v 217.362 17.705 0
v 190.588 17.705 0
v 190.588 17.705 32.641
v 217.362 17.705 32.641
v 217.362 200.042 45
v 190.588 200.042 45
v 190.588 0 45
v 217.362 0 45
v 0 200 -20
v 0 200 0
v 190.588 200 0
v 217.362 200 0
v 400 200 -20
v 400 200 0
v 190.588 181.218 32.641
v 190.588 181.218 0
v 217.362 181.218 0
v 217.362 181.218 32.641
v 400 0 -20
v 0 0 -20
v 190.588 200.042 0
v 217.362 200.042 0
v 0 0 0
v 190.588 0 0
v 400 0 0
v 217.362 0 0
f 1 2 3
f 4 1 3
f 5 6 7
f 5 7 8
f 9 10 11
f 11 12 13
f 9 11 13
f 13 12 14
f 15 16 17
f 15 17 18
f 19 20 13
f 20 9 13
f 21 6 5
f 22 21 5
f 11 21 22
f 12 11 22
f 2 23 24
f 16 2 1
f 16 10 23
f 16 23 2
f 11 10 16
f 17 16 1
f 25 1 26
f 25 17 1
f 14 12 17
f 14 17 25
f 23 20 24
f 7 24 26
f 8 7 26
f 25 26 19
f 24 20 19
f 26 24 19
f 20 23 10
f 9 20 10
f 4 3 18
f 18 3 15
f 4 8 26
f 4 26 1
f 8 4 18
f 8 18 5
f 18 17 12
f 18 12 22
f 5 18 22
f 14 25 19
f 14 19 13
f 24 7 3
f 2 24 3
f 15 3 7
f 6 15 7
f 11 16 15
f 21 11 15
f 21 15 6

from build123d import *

# Parameters (mm, degrees)
F0_W      = 400
F0_H      = 200
F1_DEPTH  = 25
F2_W      = 26.7749875784
F2_H      = 200.0415027142
F3_DEPTH  = 45
F4_W      = 163.5136380792
F4_H      = 32.6408185065
F5_DEPTH  = 400.001
F8_DEPTH  = 25
F8_TAPER  = -60
F9_W      = 212.9299342632
F9_H      = 224.1696352139
F10_DEPTH = 25
F12_W     = 417.4379836768
F12_H     = 216.8577280827
F13_DEPTH = 25


with BuildPart() as f1:
    # F0 (on Top) → F1 (new body)
    with BuildSketch(Plane.XY):
        with Locations((200, 100)):
            Rectangle(F0_W, F0_H)
    extrude(amount=-F1_DEPTH)

    # F2 (on Top) → F3 (join)
    with BuildSketch(Plane.XY):
        with Locations((203.9749994874, 100.0207513571)):
            Rectangle(F2_W, F2_H)
    extrude(amount=F3_DEPTH)

    # F4 (on Right) → F5 (cut, through all)
    with BuildSketch(Plane.YZ):
        with Locations((99.4616560638, 16.3204092532)):
            Rectangle(F4_W, F4_H)
    extrude(amount=F5_DEPTH, mode=Mode.SUBTRACT)

    # F7 (on offset) → F8 (cut)
    with BuildSketch(Plane.XY.offset(-20)):
        with BuildLine():
            add(Edge.make_bspline(
                [(391.8431701423, 100.8600369096), (391.8431701423, 259.7252513864), (102.5679333925, 180.292644148), (-186.7073033574, 100.8600369096), (102.5679333925, 21.4274296712), (391.8431701423, -58.0051775672), (391.8431701423, 100.8600369096)],
                knots=[0, 0, 0, 2.0943951024, 2.0943951024, 4.1887902048, 4.1887902048, 6.2831853072, 6.2831853072, 6.2831853072], degree=2, weights=[1, 0.5, 1, 0.5, 1, 0.5, 1]))
        make_face()
    extrude(amount=-F8_DEPTH, taper=F8_TAPER, mode=Mode.SUBTRACT)

    # F9 (on offset) → F10 (cut)
    with BuildSketch(Plane.XY.offset(-20)):
        with Locations((308.3530813456, 101.8974217586)):
            Rectangle(F9_W, F9_H)
    extrude(amount=-F10_DEPTH, mode=Mode.SUBTRACT)

    # F12 (on offset) → F13 (cut)
    with BuildSketch(Plane.XY.offset(-20)):
        with Locations((200.3057235852, 101.122589549)):
            Rectangle(F12_W, F12_H)
    extrude(amount=-F13_DEPTH, mode=Mode.SUBTRACT)


solid = f1.part
